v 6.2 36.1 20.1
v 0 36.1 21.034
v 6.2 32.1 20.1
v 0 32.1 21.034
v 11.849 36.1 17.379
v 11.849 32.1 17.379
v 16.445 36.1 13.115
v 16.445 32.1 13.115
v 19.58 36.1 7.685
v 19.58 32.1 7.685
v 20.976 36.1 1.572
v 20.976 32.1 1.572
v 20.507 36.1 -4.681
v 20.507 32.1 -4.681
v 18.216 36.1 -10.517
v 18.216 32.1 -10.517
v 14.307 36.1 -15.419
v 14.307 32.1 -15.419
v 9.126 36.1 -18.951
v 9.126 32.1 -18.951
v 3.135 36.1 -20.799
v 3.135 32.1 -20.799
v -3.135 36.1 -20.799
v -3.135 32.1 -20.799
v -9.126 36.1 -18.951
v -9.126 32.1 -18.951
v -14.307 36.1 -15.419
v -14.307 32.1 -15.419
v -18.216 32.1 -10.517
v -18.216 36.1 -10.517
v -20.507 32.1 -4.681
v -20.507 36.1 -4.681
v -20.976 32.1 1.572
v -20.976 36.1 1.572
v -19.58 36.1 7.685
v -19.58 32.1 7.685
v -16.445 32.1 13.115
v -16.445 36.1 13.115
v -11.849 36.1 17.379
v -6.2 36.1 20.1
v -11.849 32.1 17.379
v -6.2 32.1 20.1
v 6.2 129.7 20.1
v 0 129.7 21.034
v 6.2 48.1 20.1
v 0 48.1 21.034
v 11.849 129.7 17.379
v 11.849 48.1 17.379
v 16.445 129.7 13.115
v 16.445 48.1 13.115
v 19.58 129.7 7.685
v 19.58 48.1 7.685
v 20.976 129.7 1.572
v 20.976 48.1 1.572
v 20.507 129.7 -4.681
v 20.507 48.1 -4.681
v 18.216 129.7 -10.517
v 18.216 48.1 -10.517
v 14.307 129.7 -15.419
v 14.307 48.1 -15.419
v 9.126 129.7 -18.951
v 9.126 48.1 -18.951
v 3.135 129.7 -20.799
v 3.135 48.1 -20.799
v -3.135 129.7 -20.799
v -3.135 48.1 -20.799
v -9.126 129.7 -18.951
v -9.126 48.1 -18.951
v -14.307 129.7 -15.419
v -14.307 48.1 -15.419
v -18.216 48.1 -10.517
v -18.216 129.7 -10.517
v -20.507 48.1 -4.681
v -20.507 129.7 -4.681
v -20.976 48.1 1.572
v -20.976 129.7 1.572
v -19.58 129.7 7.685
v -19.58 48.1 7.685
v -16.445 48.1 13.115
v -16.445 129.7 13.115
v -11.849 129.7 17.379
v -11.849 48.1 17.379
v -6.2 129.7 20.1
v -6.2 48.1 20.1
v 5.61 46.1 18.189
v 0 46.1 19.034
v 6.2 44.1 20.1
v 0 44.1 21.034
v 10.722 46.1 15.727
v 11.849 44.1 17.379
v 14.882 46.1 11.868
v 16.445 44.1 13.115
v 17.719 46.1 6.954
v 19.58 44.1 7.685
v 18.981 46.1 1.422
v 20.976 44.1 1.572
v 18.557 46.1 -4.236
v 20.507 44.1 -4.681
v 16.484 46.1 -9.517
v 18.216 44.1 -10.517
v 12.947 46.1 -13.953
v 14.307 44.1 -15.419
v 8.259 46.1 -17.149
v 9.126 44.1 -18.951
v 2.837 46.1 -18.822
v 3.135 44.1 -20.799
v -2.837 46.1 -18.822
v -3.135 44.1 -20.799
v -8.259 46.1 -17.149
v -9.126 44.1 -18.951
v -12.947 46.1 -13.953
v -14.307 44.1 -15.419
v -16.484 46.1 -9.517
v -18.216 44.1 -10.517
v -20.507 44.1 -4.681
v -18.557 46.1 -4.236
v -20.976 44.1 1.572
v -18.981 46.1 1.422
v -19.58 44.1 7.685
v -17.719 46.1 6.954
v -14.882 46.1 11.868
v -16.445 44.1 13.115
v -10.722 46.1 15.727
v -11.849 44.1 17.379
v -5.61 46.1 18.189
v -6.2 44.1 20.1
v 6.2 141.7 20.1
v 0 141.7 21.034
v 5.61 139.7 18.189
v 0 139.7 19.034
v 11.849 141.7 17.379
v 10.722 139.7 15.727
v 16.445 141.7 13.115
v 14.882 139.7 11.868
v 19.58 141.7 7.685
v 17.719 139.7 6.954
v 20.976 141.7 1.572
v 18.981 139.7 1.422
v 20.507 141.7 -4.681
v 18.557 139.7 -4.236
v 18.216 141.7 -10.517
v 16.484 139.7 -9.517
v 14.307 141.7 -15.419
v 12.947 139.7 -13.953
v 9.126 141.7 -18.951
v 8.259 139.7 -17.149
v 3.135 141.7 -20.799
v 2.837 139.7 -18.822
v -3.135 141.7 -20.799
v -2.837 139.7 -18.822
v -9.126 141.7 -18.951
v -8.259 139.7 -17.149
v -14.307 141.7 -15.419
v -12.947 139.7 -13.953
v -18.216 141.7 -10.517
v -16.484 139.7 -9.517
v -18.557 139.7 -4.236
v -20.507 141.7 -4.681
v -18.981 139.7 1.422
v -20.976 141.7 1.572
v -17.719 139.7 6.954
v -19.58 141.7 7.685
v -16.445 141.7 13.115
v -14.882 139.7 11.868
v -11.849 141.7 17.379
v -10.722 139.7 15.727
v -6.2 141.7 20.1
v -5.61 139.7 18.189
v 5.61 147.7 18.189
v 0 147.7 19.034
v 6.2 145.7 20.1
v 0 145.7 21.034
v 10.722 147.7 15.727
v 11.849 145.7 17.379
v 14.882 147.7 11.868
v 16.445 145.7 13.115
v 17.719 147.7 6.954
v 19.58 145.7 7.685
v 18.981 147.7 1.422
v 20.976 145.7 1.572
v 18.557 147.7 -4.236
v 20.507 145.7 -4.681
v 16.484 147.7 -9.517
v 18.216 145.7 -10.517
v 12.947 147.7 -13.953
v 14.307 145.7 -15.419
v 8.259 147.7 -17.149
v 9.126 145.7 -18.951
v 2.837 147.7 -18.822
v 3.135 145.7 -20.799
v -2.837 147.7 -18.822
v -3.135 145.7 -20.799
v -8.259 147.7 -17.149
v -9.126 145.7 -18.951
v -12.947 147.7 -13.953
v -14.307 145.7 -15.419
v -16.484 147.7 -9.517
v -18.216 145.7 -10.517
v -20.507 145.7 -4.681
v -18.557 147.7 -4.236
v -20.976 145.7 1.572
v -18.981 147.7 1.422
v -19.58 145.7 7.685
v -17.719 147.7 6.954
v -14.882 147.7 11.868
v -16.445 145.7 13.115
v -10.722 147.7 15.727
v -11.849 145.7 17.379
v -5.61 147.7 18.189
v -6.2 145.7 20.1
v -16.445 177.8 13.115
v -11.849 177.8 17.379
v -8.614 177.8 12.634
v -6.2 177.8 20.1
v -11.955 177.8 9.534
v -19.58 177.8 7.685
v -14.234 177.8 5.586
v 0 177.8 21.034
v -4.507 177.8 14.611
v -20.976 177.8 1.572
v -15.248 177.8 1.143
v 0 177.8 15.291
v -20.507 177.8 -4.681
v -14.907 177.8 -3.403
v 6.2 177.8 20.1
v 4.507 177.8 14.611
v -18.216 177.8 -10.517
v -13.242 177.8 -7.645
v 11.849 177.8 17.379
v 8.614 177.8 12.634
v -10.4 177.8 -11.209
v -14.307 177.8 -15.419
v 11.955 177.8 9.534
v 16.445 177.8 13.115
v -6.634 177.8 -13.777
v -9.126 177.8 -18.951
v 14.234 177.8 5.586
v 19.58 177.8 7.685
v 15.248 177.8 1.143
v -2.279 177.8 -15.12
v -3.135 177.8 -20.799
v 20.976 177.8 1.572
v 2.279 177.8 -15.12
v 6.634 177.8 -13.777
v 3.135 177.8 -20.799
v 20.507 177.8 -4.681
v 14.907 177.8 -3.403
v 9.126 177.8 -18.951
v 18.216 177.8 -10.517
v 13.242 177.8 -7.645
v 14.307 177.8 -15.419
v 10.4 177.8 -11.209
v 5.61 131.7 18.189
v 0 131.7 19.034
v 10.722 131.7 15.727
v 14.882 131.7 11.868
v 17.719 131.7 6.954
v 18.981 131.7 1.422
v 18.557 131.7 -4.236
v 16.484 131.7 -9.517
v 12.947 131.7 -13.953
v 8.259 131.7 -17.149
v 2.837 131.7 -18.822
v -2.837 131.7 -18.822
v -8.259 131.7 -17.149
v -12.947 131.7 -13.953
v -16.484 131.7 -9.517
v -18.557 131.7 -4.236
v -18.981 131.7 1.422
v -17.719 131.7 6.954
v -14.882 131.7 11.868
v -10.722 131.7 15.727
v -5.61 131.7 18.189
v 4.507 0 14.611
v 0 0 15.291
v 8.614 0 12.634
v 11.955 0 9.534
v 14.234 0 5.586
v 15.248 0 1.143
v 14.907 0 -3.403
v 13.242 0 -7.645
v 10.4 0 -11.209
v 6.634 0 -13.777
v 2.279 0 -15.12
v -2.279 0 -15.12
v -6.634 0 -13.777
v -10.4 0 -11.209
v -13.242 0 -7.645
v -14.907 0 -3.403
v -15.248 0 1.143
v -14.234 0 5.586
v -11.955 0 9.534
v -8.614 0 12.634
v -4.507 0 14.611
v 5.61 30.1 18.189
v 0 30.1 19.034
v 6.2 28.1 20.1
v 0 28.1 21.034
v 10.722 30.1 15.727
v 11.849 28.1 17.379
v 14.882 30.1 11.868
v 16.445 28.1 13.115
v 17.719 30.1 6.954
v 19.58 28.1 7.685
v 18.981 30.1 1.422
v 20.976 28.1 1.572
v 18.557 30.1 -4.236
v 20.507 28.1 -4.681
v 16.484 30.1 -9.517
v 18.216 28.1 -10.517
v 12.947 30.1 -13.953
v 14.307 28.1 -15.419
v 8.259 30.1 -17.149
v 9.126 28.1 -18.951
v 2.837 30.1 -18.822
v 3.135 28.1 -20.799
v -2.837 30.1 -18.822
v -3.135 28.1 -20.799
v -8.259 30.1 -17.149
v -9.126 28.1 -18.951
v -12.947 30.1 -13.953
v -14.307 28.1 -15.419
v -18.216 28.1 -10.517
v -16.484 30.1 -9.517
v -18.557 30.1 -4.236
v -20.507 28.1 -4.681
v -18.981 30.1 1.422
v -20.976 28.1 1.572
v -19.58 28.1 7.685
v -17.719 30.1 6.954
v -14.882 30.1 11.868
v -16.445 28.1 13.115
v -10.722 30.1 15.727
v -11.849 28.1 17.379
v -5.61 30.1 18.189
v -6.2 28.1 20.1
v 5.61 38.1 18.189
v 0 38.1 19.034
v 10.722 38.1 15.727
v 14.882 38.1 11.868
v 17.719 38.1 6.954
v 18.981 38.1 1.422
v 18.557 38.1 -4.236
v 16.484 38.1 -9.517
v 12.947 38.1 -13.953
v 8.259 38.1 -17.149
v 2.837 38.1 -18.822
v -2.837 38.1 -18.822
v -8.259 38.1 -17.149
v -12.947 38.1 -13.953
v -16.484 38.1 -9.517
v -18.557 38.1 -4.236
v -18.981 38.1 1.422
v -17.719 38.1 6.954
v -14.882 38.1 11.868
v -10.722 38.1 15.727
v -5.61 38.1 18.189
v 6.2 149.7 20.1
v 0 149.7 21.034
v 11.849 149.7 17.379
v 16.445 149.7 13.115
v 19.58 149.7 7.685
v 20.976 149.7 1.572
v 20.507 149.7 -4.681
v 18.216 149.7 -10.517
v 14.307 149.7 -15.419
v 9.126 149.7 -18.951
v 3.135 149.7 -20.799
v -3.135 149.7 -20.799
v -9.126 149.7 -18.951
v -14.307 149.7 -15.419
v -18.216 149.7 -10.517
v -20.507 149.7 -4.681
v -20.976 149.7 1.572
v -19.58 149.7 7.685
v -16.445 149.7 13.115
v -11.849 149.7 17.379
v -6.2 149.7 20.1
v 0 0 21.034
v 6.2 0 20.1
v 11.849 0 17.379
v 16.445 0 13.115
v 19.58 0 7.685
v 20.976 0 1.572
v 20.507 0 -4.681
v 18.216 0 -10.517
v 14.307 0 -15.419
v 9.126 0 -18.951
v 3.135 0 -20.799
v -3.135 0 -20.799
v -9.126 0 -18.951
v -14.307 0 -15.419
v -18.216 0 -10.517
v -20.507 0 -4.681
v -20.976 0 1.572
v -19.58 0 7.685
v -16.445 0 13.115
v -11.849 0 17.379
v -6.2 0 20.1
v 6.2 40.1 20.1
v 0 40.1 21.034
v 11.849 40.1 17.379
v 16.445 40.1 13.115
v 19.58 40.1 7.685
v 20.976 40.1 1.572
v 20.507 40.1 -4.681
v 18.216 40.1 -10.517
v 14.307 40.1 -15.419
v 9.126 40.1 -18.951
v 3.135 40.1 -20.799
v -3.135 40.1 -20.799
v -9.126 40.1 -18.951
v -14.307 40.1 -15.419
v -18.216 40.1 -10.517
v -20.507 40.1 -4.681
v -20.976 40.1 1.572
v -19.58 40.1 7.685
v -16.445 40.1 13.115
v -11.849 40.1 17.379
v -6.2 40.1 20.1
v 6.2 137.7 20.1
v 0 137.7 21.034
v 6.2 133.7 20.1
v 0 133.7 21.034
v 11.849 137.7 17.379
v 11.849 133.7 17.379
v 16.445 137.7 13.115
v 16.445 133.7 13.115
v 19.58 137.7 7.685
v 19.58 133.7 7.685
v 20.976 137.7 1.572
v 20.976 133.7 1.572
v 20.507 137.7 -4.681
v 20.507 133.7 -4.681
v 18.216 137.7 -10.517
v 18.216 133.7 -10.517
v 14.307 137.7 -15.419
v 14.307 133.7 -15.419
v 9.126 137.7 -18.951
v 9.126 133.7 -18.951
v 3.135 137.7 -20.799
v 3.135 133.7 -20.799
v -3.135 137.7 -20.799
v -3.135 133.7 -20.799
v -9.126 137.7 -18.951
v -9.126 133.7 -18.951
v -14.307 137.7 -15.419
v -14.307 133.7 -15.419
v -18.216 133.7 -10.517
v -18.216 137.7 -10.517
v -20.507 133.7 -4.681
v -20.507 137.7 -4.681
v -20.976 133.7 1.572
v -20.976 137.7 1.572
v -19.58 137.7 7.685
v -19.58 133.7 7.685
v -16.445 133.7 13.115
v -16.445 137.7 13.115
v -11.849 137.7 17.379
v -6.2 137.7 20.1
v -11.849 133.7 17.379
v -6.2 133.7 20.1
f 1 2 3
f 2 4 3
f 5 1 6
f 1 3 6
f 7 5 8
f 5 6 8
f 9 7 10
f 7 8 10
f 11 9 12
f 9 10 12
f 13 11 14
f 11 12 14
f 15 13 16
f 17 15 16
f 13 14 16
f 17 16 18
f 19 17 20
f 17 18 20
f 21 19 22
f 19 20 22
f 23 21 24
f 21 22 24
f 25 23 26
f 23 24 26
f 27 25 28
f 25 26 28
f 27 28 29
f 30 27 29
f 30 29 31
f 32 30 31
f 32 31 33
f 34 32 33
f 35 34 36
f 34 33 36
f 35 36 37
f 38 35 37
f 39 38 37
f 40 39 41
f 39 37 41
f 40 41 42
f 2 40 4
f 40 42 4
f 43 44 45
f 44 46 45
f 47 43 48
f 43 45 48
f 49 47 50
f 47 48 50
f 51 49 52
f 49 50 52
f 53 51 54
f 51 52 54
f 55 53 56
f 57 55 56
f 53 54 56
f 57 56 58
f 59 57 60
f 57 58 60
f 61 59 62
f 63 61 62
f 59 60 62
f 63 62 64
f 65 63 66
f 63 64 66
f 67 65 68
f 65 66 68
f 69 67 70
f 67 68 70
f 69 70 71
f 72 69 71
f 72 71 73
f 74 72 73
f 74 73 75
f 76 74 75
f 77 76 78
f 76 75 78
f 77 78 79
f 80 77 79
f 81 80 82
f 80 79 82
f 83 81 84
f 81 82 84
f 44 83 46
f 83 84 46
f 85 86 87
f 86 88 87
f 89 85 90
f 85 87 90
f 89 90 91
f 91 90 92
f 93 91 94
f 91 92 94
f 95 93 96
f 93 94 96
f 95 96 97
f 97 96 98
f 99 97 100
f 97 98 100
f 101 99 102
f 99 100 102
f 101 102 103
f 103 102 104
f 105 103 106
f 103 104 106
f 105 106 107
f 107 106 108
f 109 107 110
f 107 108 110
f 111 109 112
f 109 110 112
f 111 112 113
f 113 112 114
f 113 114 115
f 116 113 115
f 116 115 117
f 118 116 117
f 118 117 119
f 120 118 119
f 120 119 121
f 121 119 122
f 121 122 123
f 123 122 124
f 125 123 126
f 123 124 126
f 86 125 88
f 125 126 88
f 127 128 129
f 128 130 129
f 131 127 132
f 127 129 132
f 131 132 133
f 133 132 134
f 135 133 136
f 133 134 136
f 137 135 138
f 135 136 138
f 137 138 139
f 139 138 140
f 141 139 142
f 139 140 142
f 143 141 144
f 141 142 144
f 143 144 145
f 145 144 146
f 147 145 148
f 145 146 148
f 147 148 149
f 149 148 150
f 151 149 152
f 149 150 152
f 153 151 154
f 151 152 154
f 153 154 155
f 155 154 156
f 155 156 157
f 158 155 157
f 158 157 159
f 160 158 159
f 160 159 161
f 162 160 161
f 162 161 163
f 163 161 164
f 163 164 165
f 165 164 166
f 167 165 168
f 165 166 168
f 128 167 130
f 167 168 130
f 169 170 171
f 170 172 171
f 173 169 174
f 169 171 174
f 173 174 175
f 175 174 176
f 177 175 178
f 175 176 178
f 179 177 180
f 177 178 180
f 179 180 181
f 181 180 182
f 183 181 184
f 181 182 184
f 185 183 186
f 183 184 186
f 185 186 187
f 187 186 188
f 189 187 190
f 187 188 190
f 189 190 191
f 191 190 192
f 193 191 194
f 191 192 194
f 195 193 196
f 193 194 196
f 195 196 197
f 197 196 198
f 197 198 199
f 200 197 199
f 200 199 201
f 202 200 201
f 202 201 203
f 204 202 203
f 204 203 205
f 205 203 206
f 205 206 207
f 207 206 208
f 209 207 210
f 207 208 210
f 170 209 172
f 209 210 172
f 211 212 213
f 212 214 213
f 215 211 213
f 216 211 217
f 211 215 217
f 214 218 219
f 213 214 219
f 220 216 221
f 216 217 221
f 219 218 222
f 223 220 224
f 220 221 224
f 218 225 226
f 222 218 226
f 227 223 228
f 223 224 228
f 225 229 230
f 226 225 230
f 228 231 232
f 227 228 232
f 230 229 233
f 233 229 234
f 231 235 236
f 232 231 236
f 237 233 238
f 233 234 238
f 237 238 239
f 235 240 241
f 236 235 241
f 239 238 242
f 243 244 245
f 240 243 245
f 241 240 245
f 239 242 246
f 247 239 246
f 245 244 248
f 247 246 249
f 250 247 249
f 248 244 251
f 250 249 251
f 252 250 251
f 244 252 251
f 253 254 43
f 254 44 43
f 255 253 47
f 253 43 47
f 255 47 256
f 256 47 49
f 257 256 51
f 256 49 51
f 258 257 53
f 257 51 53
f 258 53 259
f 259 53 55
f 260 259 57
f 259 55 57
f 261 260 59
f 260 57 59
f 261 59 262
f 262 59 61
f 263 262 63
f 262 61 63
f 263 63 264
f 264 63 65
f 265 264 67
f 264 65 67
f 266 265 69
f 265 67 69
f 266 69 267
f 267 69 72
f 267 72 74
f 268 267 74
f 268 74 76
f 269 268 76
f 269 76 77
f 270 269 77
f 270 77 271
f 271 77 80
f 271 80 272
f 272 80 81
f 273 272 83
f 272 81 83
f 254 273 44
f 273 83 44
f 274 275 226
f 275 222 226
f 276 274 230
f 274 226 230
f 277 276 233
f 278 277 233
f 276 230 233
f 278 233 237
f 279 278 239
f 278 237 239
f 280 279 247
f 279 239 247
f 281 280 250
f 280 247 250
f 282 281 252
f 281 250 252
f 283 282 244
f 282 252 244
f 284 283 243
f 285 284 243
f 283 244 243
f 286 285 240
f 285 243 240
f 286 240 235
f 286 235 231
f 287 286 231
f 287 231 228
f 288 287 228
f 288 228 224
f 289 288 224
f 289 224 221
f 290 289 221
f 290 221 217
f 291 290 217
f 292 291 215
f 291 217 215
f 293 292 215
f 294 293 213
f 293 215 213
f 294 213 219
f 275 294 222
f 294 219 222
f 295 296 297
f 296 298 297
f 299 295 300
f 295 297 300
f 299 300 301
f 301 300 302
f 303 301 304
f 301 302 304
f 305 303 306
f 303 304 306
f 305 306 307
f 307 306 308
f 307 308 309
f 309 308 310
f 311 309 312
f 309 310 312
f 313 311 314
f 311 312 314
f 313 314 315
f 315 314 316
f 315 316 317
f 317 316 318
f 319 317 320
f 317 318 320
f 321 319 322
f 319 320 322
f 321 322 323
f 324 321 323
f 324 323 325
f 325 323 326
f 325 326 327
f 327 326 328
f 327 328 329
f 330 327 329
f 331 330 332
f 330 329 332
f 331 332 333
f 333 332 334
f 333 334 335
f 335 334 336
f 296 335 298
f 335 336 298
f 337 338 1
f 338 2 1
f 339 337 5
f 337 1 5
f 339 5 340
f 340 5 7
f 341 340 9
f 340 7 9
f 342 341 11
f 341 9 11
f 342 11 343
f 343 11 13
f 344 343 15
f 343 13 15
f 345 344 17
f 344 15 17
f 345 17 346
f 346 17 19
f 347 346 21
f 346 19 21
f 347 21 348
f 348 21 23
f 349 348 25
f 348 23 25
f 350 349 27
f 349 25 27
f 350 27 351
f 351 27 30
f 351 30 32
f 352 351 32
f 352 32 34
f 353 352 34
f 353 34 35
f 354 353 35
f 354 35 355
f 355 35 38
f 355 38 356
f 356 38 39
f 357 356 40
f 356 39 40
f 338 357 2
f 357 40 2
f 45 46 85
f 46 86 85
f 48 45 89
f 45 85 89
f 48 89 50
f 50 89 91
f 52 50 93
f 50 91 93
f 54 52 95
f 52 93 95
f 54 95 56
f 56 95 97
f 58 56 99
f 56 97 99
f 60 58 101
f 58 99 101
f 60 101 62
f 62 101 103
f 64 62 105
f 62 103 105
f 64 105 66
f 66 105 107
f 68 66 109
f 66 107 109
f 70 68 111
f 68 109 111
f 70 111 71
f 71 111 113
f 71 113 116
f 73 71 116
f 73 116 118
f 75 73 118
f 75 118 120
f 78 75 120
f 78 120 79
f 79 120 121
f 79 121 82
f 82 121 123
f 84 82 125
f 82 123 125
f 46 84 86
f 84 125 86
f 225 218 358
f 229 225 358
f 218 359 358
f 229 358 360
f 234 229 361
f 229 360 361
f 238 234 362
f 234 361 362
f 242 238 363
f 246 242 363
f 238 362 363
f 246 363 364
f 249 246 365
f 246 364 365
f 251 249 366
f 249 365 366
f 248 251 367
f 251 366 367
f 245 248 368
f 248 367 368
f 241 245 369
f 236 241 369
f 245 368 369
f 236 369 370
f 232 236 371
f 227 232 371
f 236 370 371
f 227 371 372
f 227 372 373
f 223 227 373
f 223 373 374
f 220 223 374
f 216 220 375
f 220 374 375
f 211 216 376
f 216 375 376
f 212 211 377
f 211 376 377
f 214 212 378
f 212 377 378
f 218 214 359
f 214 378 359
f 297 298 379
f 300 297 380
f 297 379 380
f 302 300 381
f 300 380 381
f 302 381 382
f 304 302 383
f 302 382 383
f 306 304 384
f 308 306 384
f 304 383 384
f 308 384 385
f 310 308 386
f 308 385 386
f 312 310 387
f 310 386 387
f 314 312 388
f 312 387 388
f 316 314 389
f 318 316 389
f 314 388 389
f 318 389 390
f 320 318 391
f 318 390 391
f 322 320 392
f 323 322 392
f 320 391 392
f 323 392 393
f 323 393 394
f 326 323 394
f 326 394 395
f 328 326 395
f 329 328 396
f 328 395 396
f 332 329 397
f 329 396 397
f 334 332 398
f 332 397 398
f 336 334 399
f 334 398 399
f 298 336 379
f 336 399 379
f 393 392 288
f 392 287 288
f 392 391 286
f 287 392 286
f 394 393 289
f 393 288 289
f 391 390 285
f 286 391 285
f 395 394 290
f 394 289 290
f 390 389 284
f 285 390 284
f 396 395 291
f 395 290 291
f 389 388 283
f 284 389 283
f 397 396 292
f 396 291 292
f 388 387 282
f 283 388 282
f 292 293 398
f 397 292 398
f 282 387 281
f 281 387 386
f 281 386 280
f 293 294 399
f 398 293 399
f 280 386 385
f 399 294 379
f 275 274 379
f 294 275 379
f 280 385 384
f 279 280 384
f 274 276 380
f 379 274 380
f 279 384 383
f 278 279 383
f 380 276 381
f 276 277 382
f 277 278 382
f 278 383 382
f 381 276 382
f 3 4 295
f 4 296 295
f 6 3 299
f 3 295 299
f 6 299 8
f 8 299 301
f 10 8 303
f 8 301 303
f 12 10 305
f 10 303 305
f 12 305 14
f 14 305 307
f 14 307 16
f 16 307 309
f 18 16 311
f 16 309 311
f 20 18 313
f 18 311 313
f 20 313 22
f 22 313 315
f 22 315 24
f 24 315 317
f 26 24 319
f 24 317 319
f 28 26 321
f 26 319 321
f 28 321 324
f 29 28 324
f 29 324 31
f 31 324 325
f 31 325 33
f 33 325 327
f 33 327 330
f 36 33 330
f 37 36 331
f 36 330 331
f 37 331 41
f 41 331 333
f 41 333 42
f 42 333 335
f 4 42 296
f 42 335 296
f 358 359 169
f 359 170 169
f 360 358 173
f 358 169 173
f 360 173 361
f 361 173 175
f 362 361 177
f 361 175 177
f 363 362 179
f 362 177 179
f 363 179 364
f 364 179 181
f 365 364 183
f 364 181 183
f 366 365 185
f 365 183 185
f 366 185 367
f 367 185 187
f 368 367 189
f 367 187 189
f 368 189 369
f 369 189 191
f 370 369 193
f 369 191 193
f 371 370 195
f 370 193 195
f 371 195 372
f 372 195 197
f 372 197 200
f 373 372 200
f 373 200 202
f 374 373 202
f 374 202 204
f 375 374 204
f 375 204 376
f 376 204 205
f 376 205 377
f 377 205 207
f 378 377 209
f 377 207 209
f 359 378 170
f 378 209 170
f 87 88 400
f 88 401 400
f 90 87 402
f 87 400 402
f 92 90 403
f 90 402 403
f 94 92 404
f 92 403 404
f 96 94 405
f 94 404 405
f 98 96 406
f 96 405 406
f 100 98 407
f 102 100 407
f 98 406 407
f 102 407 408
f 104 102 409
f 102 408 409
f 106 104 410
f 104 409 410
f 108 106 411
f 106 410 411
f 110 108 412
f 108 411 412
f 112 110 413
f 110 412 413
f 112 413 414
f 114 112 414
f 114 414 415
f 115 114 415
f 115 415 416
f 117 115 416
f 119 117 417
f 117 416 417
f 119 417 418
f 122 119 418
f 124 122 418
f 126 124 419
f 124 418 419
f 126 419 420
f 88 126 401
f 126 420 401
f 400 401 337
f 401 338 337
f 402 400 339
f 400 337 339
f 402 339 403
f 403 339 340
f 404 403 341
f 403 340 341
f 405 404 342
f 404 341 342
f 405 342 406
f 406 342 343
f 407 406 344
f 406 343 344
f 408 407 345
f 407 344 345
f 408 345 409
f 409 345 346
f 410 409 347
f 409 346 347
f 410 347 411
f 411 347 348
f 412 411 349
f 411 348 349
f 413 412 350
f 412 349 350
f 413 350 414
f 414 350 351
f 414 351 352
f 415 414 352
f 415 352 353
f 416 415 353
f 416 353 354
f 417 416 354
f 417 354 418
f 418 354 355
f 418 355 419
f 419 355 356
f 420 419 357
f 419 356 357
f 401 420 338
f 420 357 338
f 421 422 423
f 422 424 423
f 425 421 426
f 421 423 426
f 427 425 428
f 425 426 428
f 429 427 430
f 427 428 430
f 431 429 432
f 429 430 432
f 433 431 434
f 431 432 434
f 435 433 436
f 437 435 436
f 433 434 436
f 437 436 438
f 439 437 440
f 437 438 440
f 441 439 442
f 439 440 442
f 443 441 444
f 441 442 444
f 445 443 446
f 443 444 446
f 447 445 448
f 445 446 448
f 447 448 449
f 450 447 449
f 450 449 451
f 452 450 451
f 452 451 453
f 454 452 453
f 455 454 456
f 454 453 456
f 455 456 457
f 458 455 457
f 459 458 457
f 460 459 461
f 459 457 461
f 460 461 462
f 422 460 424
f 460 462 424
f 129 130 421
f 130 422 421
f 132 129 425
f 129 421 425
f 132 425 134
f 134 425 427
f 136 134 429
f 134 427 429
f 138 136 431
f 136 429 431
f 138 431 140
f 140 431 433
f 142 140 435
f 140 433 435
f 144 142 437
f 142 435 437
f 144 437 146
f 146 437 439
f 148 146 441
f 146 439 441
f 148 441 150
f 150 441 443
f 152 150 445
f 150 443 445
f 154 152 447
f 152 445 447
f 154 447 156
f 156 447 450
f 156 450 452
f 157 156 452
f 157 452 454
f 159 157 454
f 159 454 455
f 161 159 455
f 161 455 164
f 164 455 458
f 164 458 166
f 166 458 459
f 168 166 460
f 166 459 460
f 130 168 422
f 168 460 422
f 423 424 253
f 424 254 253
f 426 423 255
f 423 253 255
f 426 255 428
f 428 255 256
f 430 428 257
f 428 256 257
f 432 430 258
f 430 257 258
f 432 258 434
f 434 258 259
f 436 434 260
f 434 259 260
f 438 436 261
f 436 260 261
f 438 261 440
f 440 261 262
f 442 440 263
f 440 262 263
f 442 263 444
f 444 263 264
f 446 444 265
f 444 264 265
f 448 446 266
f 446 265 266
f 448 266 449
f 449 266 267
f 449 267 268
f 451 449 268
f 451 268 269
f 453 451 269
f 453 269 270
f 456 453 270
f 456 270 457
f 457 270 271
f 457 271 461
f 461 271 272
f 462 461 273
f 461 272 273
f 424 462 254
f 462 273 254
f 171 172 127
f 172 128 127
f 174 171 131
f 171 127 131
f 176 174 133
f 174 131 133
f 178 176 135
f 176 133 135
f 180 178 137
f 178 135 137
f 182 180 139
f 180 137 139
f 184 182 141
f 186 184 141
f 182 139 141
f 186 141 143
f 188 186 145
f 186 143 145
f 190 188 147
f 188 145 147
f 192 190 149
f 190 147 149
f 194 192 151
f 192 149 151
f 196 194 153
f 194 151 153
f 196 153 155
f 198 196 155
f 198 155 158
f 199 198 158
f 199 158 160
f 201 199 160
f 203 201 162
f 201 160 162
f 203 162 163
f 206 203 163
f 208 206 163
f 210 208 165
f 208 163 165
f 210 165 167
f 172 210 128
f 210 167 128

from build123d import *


with BuildPart() as part:
    # Sketch1 → Revolve1 (revolve)
    with BuildSketch(Plane(origin=(0, 0, 0), x_dir=(-1, 0, 0), z_dir=(0, 0, -1)), mode=Mode.PRIVATE) as revolve1_sk:
        Polygon((-15.2908, 177.8), (-21.034375, 177.8), (-21.034375, 149.7), (-19.034375, 147.7), (-21.034375, 145.7), (-21.034375, 141.7), (-19.034375, 139.7), (-21.034375, 137.7), (-21.034375, 133.7), (-19.034375, 131.7), (-21.034375, 129.7), (-21.034375, 88.9), (-21.034375, 48.1), (-19.034375, 46.1), (-21.034375, 44.1), (-21.034375, 40.1), (-19.034375, 38.1), (-21.034375, 36.1), (-21.034375, 32.1), (-19.034375, 30.1), (-21.034375, 28.1), (-21.034375, 0), (-15.2908, 0), align=None)
    revolve(revolve1_sk.sketch.rotate(Axis((0, 0, 0), (0, 1, 0)), 270), axis=Axis((0, 0, 0), (0, 1, 0)))


solid = part.part
